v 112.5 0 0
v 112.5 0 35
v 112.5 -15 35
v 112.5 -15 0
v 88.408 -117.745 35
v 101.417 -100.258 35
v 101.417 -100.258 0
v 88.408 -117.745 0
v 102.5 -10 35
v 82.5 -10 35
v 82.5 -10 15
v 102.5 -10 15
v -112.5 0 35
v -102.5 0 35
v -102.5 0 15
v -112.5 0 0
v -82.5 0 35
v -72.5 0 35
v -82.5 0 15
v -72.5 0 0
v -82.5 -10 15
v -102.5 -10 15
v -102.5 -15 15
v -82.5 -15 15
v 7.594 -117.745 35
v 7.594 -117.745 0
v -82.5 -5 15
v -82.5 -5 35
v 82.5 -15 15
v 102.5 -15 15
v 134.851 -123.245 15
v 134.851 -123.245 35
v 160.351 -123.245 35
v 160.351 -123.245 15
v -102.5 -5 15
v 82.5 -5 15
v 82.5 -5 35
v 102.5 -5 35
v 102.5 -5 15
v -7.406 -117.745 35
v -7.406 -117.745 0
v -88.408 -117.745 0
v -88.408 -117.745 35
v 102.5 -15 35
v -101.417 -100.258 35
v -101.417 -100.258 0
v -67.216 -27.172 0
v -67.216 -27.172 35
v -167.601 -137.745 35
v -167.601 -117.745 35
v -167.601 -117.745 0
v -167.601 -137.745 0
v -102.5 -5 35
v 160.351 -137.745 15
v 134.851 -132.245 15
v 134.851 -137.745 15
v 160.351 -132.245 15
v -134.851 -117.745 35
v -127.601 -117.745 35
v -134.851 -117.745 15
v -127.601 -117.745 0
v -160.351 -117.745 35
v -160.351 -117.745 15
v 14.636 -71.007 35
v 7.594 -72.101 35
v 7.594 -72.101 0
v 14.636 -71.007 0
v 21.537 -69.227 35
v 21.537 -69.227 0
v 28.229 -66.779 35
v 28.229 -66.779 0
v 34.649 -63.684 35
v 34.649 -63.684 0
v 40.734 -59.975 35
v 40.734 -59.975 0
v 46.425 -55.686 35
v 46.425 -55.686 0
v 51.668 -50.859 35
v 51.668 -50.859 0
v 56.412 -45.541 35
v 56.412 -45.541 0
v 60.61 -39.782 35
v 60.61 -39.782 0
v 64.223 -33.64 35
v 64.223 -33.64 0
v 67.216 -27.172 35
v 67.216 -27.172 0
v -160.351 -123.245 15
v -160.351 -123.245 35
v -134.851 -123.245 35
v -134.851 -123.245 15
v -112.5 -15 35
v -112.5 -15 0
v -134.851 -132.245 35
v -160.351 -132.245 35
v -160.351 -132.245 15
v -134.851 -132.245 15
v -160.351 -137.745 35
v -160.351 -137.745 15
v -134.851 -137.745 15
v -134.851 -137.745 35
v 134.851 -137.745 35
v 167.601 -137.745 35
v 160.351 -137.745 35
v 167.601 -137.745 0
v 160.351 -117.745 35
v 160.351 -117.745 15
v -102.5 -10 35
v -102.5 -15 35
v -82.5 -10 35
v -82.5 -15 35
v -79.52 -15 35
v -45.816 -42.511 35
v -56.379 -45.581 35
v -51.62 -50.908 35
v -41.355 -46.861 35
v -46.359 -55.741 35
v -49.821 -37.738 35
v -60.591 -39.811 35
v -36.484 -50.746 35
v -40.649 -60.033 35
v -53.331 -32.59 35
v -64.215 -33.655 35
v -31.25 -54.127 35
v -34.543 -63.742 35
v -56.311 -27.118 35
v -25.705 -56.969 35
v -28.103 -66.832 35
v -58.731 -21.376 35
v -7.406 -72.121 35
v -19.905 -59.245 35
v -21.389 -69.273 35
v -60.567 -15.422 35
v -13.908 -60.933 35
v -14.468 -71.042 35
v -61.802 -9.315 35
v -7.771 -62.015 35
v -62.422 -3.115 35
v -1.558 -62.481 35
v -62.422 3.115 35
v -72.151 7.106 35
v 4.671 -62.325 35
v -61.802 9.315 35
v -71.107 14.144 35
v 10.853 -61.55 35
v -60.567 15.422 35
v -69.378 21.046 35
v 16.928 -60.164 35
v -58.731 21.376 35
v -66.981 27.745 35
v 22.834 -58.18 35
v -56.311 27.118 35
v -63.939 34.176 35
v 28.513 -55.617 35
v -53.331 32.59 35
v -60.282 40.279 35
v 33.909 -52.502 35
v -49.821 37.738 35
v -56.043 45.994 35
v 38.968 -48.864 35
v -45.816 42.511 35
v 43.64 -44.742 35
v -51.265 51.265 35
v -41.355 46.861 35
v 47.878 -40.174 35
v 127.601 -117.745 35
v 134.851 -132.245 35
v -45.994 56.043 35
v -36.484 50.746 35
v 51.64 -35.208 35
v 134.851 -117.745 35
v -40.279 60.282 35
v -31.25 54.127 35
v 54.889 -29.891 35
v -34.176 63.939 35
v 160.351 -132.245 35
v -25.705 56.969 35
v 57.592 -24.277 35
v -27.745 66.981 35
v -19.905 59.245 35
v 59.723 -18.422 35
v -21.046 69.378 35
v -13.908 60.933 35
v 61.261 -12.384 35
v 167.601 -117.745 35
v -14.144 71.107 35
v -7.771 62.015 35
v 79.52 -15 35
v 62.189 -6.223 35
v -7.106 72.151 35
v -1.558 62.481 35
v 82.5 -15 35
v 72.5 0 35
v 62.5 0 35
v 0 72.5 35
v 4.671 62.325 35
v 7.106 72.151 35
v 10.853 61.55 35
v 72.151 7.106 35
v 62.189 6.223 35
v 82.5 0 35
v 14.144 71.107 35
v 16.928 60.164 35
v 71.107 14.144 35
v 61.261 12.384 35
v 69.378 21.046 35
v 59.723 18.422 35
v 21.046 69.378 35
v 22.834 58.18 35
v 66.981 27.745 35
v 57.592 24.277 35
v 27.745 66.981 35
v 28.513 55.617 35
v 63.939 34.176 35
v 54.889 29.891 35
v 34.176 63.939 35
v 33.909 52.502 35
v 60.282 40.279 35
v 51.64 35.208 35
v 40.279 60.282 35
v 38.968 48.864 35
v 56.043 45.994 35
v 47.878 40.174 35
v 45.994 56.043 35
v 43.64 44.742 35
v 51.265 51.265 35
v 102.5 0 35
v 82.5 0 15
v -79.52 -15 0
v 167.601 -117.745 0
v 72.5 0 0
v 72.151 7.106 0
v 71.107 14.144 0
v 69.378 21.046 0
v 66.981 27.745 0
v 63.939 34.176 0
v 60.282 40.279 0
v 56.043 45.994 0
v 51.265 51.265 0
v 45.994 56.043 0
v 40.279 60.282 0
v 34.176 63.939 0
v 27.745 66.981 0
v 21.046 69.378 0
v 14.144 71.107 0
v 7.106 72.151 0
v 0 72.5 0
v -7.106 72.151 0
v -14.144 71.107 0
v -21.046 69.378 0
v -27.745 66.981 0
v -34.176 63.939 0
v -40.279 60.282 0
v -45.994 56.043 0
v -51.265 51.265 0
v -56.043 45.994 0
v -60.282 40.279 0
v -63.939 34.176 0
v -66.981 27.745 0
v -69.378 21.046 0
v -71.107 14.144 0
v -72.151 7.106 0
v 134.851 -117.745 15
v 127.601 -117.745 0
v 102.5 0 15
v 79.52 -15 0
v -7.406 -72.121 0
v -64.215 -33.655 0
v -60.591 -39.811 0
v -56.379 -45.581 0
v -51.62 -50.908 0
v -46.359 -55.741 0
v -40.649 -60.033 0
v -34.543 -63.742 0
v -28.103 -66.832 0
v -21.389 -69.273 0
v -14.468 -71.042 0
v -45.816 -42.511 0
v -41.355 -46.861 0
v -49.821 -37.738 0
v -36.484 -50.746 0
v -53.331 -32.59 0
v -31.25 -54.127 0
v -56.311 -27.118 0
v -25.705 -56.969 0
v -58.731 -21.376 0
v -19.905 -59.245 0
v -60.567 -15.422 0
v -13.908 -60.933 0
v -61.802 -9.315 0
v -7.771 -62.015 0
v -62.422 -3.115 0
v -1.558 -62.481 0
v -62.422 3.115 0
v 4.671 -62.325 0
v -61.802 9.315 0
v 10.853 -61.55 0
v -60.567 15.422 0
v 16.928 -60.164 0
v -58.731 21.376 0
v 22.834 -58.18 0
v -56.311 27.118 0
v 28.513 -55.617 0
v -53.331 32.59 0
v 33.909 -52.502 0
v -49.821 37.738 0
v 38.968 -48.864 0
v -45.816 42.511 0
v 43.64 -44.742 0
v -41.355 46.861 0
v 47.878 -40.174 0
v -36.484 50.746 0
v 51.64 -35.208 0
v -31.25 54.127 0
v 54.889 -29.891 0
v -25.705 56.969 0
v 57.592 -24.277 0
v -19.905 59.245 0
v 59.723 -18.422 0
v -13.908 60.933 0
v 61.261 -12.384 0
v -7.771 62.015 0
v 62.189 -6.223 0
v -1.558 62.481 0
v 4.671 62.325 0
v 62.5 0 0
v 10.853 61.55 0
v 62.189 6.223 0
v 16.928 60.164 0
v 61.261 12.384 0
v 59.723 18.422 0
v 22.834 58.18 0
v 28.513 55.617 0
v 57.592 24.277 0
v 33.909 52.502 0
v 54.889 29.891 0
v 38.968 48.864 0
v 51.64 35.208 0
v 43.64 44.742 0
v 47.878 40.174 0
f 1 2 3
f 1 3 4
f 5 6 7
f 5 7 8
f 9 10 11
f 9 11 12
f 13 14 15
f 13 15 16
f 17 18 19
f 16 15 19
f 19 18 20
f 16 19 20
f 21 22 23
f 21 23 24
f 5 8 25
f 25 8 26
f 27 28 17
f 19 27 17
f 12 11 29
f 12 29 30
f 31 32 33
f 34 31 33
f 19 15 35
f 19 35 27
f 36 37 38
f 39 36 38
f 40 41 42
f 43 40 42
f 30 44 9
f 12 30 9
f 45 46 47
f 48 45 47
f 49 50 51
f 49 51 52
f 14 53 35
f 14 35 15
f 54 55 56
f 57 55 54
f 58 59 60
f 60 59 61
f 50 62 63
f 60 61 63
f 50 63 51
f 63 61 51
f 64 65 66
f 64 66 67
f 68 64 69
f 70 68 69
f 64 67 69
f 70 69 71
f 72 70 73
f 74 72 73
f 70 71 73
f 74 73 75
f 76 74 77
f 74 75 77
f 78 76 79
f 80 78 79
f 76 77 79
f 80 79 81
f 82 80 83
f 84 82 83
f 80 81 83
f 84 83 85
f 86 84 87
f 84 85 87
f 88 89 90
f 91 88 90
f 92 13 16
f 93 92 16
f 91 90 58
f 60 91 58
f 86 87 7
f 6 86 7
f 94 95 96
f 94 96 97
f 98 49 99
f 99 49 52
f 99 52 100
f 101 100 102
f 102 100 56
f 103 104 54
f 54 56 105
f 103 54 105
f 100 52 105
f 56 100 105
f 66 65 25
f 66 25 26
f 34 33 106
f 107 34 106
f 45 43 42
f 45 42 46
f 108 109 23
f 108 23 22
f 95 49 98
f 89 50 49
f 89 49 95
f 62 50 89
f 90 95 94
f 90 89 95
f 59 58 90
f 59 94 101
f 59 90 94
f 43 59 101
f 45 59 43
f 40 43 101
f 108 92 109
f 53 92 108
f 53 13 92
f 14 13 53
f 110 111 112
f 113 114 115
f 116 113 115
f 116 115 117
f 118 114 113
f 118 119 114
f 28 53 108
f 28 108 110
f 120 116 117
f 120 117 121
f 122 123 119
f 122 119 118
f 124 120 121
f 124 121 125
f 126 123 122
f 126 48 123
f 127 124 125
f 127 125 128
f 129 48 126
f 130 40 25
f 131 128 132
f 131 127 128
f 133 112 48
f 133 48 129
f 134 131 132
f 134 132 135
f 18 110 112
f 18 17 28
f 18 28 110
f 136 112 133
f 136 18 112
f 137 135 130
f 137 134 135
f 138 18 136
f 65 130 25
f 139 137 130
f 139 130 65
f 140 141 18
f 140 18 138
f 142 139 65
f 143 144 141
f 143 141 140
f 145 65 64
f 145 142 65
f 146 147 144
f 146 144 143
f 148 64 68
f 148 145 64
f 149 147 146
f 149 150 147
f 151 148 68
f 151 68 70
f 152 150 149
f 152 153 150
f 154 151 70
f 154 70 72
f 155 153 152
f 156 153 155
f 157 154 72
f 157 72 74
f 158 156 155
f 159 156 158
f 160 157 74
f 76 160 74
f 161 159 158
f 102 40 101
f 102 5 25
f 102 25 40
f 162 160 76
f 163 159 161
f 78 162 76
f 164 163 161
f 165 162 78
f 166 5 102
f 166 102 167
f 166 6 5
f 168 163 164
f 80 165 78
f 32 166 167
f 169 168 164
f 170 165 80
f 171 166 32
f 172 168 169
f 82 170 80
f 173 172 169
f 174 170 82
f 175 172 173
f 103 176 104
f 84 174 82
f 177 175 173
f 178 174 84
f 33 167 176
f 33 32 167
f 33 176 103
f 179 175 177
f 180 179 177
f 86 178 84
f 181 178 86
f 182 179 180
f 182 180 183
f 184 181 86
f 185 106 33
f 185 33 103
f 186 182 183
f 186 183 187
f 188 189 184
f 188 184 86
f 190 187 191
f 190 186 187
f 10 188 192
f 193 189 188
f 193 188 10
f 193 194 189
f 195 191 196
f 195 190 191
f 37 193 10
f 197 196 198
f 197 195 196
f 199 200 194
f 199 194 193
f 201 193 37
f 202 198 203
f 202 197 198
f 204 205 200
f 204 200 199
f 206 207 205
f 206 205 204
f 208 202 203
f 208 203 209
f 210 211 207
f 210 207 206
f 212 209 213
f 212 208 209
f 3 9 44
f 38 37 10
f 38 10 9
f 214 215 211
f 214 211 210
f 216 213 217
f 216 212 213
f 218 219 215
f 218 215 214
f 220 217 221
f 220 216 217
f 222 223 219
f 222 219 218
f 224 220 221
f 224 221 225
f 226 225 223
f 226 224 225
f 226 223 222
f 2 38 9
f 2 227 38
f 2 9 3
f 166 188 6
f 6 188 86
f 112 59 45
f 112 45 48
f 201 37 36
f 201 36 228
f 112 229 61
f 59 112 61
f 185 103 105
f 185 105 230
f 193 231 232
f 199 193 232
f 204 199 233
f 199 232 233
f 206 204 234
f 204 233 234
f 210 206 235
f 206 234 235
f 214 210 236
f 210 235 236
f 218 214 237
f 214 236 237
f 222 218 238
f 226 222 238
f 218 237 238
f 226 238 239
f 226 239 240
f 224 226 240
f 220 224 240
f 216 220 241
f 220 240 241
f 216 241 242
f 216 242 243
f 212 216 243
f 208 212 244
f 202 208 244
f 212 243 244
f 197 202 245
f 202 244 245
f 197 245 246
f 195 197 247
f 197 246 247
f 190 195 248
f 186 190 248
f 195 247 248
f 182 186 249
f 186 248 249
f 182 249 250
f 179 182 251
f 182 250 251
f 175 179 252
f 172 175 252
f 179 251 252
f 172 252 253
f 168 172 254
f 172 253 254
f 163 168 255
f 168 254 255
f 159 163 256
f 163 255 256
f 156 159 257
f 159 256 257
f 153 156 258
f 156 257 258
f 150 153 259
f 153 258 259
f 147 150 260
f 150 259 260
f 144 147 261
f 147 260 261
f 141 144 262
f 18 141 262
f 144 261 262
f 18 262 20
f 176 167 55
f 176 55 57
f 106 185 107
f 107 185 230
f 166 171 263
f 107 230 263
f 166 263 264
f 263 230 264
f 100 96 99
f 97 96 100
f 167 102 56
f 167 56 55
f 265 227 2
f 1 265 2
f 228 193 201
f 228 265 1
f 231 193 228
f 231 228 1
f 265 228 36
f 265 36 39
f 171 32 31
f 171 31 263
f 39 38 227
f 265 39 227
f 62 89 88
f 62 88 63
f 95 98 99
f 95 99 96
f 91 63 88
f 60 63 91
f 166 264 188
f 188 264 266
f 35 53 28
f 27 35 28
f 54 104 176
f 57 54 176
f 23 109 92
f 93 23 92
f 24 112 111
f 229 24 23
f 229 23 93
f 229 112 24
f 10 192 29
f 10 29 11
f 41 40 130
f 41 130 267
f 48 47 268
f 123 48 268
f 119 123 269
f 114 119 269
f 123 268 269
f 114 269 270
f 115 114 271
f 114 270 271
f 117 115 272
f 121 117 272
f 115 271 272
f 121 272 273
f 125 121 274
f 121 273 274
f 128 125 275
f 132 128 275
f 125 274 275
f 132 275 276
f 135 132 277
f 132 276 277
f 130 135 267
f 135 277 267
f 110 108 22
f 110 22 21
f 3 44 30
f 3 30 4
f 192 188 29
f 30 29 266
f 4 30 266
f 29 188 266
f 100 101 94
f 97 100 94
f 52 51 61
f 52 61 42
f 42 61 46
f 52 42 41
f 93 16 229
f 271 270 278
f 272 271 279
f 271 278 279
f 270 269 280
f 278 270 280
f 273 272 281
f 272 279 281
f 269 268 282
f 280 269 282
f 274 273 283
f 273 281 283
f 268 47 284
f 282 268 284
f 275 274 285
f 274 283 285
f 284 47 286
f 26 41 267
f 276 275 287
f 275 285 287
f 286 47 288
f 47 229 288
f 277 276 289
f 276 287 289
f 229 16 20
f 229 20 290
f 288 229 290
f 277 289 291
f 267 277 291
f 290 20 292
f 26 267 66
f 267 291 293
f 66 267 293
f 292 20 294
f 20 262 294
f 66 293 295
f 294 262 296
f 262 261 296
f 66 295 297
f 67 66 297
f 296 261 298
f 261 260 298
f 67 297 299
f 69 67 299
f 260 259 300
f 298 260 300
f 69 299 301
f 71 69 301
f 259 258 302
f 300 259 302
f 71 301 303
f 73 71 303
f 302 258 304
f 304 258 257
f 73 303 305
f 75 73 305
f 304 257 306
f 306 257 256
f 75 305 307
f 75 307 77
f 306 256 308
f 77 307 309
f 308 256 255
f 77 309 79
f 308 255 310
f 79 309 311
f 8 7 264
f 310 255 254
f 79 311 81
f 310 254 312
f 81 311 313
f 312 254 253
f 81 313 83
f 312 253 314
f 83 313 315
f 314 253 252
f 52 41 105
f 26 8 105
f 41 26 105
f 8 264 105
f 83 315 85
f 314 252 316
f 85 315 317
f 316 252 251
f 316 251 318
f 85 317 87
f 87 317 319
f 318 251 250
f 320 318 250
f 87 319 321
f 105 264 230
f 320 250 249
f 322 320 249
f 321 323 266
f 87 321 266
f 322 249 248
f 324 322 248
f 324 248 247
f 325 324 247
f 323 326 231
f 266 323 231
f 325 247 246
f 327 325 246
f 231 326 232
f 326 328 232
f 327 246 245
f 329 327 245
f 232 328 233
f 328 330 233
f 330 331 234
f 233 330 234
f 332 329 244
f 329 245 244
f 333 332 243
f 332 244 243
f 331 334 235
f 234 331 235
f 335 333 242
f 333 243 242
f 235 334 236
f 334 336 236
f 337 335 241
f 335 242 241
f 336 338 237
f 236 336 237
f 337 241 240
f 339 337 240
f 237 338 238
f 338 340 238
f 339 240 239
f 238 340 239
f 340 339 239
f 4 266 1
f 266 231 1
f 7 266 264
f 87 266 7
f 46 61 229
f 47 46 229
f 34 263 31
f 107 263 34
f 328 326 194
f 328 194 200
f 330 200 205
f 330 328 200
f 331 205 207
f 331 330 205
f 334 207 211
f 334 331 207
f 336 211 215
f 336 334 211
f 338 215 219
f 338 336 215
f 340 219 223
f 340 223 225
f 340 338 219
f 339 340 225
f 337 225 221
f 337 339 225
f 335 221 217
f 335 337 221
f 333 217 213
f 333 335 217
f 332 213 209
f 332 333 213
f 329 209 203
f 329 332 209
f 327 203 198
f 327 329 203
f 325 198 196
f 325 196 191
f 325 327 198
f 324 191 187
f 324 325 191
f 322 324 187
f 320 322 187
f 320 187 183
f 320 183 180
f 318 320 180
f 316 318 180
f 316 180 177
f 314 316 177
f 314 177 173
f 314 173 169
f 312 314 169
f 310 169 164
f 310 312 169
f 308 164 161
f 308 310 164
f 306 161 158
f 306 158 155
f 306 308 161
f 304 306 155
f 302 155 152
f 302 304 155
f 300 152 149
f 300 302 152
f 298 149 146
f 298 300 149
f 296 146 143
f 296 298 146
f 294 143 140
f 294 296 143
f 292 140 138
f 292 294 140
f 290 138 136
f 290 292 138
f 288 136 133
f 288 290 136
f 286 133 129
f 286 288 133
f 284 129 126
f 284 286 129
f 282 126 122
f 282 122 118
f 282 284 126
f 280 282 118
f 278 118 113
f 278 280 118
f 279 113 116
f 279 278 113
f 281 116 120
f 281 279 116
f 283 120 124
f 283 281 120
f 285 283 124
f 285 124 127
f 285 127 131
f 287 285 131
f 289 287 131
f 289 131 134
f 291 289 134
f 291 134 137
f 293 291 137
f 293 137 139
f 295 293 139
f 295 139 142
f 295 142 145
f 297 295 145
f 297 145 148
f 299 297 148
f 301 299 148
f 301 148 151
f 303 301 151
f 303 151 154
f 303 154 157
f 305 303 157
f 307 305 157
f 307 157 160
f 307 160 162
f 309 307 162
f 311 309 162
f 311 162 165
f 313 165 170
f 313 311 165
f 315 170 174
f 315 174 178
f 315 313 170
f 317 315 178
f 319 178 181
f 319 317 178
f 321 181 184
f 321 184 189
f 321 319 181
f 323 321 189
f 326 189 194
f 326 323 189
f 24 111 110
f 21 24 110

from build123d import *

# Parameters (mm, degrees)
SKETCH1_R            = 62.5
BOSS_EXTRUDE8_DEPTH  = 35
BOSS_EXTRUDE9_REACH  = 192.245
SKETCH2_W            = 15
SKETCH2_H            = 35
SKETCH10_W           = 35
SKETCH10_H           = 15
BOSS_EXTRUDE12_DEPTH = 40
SKETCH6_W            = 35
SKETCH6_H            = 15
BOSS_EXTRUDE10_DEPTH = 40
SKETCH11_W           = 20
SKETCH11_H           = 5
SKETCH11_W_2         = 25.5
SKETCH11_H_2         = 5.5
CUT_EXTRUDE1_DEPTH   = 20


with BuildPart() as part:
    # Sketch1 → Boss-Extrude8 (new body)
    with BuildSketch(Plane.XY):
        with BuildLine():
            Line((127.600917431, -117.745016448), (72.5, 0))
            ThreePointArc((72.5, 0), (0, 72.5), (-72.5, 0))
            Line((-72.5, 0), (-127.600917431, -117.745016448))
            Line((-127.600917431, -117.745016448), (-167.600917431, -117.745016448))
            Line((-167.600917431, -117.745016448), (-167.600917431, -137.745016448))
            Line((-167.600917431, -137.745016448), (167.600917431, -137.745016448))
            Line((167.600917431, -137.745016448), (167.600917431, -117.745016448))
            Line((167.600917431, -117.745016448), (127.600917431, -117.745016448))
        make_face()
        with BuildLine():
            ThreePointArc((-67.21559633, -27.171926873), (0, -72.5), (67.21559633, -27.171926873))
            Line((67.21559633, -27.171926873), (101.417450928, -100.25778678))
            Line((101.417450928, -100.25778678), (88.408256881, -117.745016448))
            Line((88.408256881, -117.745016448), (-88.408256881, -117.745016448))
            Line((-88.408256881, -117.745016448), (-101.417450928, -100.25778678))
            Line((-101.417450928, -100.25778678), (-67.21559633, -27.171926873))
        make_face(mode=Mode.SUBTRACT)
        Circle(SKETCH1_R, mode=Mode.SUBTRACT)
    extrude(amount=BOSS_EXTRUDE8_DEPTH)

    # Sketch2 → Boss-Extrude9 (add, up to next)
    with BuildSketch(Plane(origin=(0, -117.745016448, 0), x_dir=(1, 0, 0), z_dir=(0, 1, 0)), mode=Mode.PRIVATE) as boss_extrude9_sk1:
        with Locations((0.093911399, -17.5)):
            Rectangle(SKETCH2_W, SKETCH2_H)
    boss_extrude9_tool1 = extrude(boss_extrude9_sk1.sketch, amount=BOSS_EXTRUDE9_REACH, mode=Mode.PRIVATE) - part.part
    add(boss_extrude9_tool1.solids().sort_by_distance((0.093911, -117.745016, 17.5))[0])

    # Sketch10 → Boss-Extrude12 (add)
    with BuildSketch(Plane(origin=(-72.5, 0, 0), x_dir=(0, 0, -1), z_dir=(1, 0, 0))):
        with Locations((-17.5, -7.5)):
            Rectangle(SKETCH10_W, SKETCH10_H)
    extrude(amount=-BOSS_EXTRUDE12_DEPTH)

    # Sketch6 → Boss-Extrude10 (add)
    with BuildSketch(Plane(origin=(72.5, 0, 0), x_dir=(0, 0, -1), z_dir=(1, 0, 0))):
        with Locations((-17.5, -7.5)):
            Rectangle(SKETCH6_W, SKETCH6_H)
    extrude(amount=BOSS_EXTRUDE10_DEPTH)

    # Sketch11 → Cut-Extrude1 (cut)
    with BuildSketch(Plane.XY.offset(35)):
        with Locations((-92.5, -2.5)):
            Rectangle(SKETCH11_W, SKETCH11_H)
        with Locations((-92.5, -12.5)):
            Rectangle(SKETCH11_W, SKETCH11_H)
        with Locations((92.5, -2.5)):
            Rectangle(SKETCH11_W, SKETCH11_H)
        with Locations((92.5, -12.5)):
            Rectangle(SKETCH11_W, SKETCH11_H)
        with Locations((147.600917431, -120.495016448)):
            Rectangle(SKETCH11_W_2, SKETCH11_H_2)
        with Locations((147.600917431, -134.995016448)):
            Rectangle(SKETCH11_W_2, SKETCH11_H_2)
        with Locations((-147.600917431, -120.495016448)):
            Rectangle(SKETCH11_W_2, SKETCH11_H_2)
        with Locations((-147.600917431, -134.995016448)):
            Rectangle(SKETCH11_W_2, SKETCH11_H_2)
    extrude(amount=-CUT_EXTRUDE1_DEPTH, mode=Mode.SUBTRACT)


solid = part.part
